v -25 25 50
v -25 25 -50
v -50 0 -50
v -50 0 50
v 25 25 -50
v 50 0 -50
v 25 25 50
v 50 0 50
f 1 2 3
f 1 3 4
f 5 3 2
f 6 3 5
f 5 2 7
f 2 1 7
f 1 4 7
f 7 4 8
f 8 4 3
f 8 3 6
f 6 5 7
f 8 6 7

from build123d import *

# Parameters (mm, degrees)
F0_W     = 100
F0_H     = 100
F1_DEPTH = 25
F2_SIZE  = 24.99999


# Not quite as in the source:
# - a fillet or chamfer is up to 0.001 mm smaller than in the source, because OpenCascade refuses the exact size


with BuildPart() as f1:
    # F0 (on Front) → F1 (new body)
    with BuildSketch(Plane.XZ):
        Rectangle(F0_W, F0_H)
    extrude(amount=-F1_DEPTH)

    # F2 (size 25 in the source; OpenCascade refuses exactly that, so slightly less here)
    f2_edges = [f1.edges().sort_by_distance(p)[0] for p in [
        (50, 25, 0),
        (-50, 25, 0),
    ]]
    chamfer(f2_edges, length=F2_SIZE)


solid = f1.part
